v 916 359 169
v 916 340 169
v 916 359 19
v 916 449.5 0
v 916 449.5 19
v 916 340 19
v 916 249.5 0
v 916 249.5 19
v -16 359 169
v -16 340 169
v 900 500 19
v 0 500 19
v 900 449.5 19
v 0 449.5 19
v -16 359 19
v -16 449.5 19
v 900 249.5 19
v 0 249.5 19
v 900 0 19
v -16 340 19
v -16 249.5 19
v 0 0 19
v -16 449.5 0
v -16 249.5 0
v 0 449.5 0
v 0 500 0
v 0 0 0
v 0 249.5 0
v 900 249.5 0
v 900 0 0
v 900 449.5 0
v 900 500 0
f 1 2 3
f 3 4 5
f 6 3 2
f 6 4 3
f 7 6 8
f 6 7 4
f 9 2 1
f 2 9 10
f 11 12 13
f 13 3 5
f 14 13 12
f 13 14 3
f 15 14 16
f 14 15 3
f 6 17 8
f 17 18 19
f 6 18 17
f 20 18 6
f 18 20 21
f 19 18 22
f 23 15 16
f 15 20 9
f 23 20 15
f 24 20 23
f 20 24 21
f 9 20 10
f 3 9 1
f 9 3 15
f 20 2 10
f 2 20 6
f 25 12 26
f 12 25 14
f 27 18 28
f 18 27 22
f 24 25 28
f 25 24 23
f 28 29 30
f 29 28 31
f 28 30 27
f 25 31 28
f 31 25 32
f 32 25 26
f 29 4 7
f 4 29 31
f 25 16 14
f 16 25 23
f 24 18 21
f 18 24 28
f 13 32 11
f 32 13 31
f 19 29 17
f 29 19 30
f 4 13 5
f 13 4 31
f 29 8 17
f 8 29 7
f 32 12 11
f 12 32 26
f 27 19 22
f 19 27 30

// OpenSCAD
/*
    top
*/

module top (
    thicknessMdf,
    totalWidth,
    totalDepth,
    x,y,z
    ){
/*
    ---------- Local varibles ---------- 
*/

//routerBoxHeight = 400;
//positionShelfHeight = ;
fenceHeight = 150;
sliderWidth = 16;
sliderHeight = thicknessMdf;
sliderDepth = 200;
        
/*
    ---------- Code ---------- 
*/
  
translate([
    x,
    y,
    z])
union () {

// Top
translate([
    0,
    0,
    0])
cube([
    totalWidth,
    totalDepth,
    thicknessMdf]);

// ---------- Fence ----------
translate([
    0,
    340,
    0])
union () {

// Fence
translate([
    -sliderWidth,
    0,
    thicknessMdf])
cube([
    totalWidth+sliderWidth*2,
    thicknessMdf,
    fenceHeight]);

// Slider 1
translate([
    -sliderWidth,
    -sliderDepth/2+thicknessMdf/2,
    0])
cube([
    sliderWidth,
    sliderDepth,
    sliderHeight]);
      
// Slider 2
translate([
    totalWidth,
    -sliderDepth/2+thicknessMdf/2,
    0])
cube([
    sliderWidth,
    sliderDepth,
    sliderHeight]);
    
}
}
}


/*
    ---------- Example ---------- 
*/

sideOverhangWidth = 100;
sideOverhangDepth = 50;

thicknessMdf = 19;
thicknessPlywood = 12; 

totalHeight = 900;
totalWidth = 900; // t-profile
totalDepth = 500;

foundationHeight = 
    totalHeight
    -thicknessMdf;
foundationWidth = 
    totalWidth
    -sideOverhangWidth*2;
foundationDepth =
    totalDepth
    -sideOverhangDepth*2;

top (
    thicknessMdf,
    totalWidth,
    totalDepth,
    0,0,0
    );
